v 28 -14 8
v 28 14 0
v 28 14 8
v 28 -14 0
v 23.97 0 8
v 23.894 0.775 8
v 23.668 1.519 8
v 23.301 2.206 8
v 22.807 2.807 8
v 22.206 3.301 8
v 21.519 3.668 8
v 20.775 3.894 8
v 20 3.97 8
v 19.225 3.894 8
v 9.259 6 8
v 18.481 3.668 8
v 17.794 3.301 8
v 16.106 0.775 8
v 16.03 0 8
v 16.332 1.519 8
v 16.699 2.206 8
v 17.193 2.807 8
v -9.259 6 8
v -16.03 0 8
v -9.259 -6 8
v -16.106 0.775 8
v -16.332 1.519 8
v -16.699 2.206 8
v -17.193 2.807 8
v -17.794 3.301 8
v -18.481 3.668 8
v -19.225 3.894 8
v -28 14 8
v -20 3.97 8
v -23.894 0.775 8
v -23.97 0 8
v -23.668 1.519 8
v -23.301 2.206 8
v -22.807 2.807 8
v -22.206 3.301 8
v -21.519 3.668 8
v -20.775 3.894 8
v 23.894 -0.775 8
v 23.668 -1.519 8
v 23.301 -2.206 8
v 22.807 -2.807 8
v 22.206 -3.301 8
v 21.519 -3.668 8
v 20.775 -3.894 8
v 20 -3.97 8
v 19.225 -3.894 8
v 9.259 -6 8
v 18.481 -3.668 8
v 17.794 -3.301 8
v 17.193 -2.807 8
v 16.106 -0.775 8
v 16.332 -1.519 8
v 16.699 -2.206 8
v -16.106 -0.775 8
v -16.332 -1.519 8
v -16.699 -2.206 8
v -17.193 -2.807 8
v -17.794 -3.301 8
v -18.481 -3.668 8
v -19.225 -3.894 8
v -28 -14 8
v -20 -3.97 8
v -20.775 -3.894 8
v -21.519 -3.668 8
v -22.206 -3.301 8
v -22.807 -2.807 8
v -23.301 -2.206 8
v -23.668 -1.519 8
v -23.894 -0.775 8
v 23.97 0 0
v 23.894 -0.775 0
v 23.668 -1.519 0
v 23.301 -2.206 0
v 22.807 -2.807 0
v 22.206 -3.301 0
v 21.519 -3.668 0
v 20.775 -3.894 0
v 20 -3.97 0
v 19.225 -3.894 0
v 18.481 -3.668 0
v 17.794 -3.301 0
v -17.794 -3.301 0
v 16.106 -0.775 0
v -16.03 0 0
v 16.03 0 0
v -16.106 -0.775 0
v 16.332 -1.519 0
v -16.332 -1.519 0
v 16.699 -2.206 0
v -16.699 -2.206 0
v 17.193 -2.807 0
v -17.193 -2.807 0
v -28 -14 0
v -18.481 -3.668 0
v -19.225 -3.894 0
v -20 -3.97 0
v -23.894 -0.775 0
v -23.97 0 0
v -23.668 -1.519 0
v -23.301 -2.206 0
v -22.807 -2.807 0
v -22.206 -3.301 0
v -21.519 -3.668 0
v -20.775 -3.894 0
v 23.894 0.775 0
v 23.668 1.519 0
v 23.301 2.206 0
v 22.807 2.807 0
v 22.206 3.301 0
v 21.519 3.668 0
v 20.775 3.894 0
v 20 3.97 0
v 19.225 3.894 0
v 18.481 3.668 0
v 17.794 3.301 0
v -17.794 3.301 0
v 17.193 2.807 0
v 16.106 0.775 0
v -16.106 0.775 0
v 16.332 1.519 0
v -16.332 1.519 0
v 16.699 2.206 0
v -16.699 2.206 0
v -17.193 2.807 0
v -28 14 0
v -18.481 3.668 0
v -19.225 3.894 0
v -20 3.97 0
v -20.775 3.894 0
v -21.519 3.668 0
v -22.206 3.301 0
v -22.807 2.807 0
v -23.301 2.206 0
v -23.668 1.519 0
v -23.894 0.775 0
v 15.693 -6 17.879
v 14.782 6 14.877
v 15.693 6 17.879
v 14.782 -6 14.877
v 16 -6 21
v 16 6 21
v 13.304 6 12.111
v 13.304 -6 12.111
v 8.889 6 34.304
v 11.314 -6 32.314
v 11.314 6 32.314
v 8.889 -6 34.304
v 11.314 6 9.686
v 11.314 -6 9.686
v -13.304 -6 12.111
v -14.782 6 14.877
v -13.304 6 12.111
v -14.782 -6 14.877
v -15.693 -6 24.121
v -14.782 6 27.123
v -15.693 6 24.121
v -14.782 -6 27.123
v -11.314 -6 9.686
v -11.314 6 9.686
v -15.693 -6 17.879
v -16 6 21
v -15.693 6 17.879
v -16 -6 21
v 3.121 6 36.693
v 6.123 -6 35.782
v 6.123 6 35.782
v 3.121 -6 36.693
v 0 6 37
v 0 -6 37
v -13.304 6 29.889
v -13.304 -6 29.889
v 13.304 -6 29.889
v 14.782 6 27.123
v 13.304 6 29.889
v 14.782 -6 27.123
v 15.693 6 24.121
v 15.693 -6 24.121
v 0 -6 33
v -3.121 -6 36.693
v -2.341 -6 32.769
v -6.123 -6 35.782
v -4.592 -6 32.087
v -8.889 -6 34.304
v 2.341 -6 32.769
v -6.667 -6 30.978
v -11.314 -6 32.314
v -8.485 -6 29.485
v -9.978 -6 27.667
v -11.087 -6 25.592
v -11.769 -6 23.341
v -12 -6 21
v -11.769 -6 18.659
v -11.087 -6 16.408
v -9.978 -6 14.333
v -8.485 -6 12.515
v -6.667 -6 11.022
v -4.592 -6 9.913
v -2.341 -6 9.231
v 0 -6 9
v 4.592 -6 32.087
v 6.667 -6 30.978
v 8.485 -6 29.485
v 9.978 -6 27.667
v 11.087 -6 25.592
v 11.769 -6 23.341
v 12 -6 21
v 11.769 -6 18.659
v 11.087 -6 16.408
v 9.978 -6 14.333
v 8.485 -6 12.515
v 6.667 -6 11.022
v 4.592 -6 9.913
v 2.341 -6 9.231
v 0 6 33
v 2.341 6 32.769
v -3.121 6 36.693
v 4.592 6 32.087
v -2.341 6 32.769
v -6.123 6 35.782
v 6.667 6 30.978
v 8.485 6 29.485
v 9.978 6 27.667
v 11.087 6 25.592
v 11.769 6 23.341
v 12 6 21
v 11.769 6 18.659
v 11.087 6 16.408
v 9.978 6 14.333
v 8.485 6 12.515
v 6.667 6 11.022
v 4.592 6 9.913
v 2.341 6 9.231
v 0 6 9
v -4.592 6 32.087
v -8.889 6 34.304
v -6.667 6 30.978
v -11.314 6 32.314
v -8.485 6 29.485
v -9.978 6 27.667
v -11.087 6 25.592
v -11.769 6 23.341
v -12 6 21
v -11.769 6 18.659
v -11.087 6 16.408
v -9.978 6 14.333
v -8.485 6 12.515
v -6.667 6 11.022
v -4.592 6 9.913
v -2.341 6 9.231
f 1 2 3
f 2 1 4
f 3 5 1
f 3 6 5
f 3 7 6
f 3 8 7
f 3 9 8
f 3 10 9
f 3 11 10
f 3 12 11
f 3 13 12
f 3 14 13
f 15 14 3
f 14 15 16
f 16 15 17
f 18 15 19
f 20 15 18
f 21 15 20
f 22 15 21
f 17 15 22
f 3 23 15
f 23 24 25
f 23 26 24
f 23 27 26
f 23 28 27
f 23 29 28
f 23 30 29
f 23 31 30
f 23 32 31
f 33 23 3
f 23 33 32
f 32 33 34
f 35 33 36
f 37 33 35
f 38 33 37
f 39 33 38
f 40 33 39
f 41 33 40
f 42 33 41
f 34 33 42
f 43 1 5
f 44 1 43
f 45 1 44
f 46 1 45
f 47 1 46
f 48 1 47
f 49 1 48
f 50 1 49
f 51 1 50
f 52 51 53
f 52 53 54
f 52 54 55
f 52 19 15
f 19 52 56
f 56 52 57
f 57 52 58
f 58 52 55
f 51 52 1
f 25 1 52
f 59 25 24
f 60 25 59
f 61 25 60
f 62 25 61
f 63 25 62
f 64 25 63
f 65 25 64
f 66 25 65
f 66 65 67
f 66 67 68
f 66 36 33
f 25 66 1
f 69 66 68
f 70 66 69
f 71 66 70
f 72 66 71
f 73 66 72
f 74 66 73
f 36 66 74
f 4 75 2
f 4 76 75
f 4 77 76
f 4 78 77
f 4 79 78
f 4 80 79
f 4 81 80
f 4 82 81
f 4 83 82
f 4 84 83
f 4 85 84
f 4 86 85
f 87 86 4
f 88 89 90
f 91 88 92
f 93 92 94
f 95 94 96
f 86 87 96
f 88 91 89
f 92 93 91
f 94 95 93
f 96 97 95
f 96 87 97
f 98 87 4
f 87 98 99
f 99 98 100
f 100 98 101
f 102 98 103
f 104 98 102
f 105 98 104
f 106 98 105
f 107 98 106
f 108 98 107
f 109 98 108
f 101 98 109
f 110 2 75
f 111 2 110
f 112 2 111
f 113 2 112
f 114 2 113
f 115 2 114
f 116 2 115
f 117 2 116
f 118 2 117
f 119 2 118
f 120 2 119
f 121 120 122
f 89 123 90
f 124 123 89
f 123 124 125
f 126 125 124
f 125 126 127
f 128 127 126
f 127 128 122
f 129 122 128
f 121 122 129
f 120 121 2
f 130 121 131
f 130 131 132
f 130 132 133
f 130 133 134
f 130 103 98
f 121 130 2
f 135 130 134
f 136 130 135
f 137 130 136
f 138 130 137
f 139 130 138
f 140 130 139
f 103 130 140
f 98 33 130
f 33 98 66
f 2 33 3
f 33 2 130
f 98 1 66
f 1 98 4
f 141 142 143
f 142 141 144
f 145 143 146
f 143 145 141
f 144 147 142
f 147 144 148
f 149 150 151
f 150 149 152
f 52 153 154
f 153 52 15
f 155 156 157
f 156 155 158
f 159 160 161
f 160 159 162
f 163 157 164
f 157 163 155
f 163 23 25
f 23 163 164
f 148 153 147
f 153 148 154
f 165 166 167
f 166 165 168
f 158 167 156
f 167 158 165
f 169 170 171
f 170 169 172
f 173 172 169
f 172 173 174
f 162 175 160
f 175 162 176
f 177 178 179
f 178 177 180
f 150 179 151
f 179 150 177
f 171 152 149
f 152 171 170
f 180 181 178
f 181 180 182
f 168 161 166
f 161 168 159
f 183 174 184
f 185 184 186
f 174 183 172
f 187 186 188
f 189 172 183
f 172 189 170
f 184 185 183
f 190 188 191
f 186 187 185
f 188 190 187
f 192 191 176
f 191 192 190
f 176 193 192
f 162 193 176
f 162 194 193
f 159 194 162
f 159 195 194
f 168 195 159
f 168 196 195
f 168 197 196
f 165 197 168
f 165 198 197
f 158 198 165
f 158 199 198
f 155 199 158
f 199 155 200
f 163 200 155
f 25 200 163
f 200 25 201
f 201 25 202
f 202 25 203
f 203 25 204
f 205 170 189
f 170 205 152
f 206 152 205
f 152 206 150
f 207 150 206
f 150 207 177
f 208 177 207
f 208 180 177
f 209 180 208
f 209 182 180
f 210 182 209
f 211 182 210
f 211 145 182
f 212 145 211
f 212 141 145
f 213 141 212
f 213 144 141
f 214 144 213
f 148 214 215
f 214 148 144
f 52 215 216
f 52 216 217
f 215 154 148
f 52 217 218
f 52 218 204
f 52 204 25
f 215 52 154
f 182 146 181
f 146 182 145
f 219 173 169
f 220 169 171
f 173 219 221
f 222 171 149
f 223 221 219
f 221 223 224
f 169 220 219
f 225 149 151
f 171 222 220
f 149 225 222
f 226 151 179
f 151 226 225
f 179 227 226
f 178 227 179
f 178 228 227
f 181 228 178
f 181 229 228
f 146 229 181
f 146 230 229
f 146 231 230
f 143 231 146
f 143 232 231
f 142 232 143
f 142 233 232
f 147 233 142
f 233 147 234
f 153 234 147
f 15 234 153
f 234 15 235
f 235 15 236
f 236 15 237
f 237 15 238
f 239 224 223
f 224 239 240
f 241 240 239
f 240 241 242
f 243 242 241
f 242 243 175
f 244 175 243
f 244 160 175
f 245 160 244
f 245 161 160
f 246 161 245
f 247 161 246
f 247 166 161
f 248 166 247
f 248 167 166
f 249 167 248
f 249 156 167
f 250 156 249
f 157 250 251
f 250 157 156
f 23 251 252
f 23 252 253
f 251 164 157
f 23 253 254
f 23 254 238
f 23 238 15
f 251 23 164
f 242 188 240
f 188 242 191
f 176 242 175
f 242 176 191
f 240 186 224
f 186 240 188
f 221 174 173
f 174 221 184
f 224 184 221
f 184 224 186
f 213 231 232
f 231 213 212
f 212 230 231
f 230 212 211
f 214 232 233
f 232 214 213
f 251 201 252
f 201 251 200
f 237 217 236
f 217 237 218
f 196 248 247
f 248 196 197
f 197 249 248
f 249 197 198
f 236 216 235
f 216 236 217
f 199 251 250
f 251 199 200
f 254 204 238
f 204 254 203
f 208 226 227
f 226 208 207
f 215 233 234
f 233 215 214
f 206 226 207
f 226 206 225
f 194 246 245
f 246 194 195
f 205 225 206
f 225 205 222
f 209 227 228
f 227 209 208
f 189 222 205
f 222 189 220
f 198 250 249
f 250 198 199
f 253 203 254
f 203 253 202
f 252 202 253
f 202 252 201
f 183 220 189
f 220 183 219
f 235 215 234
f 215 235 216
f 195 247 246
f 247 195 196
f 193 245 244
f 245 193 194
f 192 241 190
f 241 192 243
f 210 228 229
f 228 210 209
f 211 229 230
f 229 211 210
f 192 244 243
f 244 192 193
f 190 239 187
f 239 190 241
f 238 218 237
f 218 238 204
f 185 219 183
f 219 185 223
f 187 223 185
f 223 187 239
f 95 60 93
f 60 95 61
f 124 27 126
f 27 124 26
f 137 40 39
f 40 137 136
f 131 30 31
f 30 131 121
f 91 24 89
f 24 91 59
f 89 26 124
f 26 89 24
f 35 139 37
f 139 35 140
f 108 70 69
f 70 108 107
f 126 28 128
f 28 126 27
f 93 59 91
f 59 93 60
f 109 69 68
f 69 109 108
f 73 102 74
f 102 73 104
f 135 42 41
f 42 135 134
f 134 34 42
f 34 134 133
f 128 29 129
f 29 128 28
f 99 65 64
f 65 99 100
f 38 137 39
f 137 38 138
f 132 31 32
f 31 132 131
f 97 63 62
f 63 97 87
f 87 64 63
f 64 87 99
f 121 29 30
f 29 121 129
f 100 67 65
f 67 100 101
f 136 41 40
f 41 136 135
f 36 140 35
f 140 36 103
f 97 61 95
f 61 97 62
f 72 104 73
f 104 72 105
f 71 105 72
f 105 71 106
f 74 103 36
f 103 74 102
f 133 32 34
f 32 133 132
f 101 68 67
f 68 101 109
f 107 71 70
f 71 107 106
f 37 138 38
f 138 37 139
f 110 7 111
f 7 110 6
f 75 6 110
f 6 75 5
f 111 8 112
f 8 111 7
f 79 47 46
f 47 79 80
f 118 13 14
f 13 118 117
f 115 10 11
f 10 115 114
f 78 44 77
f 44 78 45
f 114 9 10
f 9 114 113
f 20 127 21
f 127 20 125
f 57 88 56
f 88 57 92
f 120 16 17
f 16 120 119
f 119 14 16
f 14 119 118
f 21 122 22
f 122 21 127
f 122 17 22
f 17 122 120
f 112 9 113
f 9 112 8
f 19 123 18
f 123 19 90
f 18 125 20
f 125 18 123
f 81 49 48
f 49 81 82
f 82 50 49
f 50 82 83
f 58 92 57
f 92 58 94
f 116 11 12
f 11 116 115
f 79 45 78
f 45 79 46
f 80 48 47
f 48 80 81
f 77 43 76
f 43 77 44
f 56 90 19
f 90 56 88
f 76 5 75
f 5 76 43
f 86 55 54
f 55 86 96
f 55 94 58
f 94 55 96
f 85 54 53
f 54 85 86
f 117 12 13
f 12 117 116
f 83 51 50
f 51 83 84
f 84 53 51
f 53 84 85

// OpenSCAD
$fn = 32;

// ----------------------------------------------------------------------
// Deck eye: 32 mm eye on a 56 mm base
// ----------------------------------------------------------------------

// --- parameters (mm) ---
base_l = 56;              // base length
base_w = 28;              // base width
base_t = 8;               // base thickness
eye_r = 16;               // eye outside radius
eye_bore = 24;            // eye bore diameter
eye_w = 12;               // eye thickness
eye_z = 21;               // eye centre height
holes_d = 7.94;           // fixing holes
hole_x = 20;              // fixing hole spacing

difference() {
  union() {
    translate([-28, -14, 0]) cube([base_l, base_w, base_t]);
    /* eye standing upright, its foot sunk 3 mm into the base */
    translate([0, -6, 21]) rotate([-90, 0, 0]) cylinder(h = 12, d = 32);
  }
  /* eye bore, 2.5 mm clear of both faces */
  translate([0, -8.5, 21]) rotate([-90, 0, 0]) cylinder(h = 17, d = 24);
  translate([-20, 0, -2.5]) cylinder(h = base_t + 5, d = holes_d);
  translate([20, 0, -2.5]) cylinder(h = base_t + 5, d = holes_d);
}
